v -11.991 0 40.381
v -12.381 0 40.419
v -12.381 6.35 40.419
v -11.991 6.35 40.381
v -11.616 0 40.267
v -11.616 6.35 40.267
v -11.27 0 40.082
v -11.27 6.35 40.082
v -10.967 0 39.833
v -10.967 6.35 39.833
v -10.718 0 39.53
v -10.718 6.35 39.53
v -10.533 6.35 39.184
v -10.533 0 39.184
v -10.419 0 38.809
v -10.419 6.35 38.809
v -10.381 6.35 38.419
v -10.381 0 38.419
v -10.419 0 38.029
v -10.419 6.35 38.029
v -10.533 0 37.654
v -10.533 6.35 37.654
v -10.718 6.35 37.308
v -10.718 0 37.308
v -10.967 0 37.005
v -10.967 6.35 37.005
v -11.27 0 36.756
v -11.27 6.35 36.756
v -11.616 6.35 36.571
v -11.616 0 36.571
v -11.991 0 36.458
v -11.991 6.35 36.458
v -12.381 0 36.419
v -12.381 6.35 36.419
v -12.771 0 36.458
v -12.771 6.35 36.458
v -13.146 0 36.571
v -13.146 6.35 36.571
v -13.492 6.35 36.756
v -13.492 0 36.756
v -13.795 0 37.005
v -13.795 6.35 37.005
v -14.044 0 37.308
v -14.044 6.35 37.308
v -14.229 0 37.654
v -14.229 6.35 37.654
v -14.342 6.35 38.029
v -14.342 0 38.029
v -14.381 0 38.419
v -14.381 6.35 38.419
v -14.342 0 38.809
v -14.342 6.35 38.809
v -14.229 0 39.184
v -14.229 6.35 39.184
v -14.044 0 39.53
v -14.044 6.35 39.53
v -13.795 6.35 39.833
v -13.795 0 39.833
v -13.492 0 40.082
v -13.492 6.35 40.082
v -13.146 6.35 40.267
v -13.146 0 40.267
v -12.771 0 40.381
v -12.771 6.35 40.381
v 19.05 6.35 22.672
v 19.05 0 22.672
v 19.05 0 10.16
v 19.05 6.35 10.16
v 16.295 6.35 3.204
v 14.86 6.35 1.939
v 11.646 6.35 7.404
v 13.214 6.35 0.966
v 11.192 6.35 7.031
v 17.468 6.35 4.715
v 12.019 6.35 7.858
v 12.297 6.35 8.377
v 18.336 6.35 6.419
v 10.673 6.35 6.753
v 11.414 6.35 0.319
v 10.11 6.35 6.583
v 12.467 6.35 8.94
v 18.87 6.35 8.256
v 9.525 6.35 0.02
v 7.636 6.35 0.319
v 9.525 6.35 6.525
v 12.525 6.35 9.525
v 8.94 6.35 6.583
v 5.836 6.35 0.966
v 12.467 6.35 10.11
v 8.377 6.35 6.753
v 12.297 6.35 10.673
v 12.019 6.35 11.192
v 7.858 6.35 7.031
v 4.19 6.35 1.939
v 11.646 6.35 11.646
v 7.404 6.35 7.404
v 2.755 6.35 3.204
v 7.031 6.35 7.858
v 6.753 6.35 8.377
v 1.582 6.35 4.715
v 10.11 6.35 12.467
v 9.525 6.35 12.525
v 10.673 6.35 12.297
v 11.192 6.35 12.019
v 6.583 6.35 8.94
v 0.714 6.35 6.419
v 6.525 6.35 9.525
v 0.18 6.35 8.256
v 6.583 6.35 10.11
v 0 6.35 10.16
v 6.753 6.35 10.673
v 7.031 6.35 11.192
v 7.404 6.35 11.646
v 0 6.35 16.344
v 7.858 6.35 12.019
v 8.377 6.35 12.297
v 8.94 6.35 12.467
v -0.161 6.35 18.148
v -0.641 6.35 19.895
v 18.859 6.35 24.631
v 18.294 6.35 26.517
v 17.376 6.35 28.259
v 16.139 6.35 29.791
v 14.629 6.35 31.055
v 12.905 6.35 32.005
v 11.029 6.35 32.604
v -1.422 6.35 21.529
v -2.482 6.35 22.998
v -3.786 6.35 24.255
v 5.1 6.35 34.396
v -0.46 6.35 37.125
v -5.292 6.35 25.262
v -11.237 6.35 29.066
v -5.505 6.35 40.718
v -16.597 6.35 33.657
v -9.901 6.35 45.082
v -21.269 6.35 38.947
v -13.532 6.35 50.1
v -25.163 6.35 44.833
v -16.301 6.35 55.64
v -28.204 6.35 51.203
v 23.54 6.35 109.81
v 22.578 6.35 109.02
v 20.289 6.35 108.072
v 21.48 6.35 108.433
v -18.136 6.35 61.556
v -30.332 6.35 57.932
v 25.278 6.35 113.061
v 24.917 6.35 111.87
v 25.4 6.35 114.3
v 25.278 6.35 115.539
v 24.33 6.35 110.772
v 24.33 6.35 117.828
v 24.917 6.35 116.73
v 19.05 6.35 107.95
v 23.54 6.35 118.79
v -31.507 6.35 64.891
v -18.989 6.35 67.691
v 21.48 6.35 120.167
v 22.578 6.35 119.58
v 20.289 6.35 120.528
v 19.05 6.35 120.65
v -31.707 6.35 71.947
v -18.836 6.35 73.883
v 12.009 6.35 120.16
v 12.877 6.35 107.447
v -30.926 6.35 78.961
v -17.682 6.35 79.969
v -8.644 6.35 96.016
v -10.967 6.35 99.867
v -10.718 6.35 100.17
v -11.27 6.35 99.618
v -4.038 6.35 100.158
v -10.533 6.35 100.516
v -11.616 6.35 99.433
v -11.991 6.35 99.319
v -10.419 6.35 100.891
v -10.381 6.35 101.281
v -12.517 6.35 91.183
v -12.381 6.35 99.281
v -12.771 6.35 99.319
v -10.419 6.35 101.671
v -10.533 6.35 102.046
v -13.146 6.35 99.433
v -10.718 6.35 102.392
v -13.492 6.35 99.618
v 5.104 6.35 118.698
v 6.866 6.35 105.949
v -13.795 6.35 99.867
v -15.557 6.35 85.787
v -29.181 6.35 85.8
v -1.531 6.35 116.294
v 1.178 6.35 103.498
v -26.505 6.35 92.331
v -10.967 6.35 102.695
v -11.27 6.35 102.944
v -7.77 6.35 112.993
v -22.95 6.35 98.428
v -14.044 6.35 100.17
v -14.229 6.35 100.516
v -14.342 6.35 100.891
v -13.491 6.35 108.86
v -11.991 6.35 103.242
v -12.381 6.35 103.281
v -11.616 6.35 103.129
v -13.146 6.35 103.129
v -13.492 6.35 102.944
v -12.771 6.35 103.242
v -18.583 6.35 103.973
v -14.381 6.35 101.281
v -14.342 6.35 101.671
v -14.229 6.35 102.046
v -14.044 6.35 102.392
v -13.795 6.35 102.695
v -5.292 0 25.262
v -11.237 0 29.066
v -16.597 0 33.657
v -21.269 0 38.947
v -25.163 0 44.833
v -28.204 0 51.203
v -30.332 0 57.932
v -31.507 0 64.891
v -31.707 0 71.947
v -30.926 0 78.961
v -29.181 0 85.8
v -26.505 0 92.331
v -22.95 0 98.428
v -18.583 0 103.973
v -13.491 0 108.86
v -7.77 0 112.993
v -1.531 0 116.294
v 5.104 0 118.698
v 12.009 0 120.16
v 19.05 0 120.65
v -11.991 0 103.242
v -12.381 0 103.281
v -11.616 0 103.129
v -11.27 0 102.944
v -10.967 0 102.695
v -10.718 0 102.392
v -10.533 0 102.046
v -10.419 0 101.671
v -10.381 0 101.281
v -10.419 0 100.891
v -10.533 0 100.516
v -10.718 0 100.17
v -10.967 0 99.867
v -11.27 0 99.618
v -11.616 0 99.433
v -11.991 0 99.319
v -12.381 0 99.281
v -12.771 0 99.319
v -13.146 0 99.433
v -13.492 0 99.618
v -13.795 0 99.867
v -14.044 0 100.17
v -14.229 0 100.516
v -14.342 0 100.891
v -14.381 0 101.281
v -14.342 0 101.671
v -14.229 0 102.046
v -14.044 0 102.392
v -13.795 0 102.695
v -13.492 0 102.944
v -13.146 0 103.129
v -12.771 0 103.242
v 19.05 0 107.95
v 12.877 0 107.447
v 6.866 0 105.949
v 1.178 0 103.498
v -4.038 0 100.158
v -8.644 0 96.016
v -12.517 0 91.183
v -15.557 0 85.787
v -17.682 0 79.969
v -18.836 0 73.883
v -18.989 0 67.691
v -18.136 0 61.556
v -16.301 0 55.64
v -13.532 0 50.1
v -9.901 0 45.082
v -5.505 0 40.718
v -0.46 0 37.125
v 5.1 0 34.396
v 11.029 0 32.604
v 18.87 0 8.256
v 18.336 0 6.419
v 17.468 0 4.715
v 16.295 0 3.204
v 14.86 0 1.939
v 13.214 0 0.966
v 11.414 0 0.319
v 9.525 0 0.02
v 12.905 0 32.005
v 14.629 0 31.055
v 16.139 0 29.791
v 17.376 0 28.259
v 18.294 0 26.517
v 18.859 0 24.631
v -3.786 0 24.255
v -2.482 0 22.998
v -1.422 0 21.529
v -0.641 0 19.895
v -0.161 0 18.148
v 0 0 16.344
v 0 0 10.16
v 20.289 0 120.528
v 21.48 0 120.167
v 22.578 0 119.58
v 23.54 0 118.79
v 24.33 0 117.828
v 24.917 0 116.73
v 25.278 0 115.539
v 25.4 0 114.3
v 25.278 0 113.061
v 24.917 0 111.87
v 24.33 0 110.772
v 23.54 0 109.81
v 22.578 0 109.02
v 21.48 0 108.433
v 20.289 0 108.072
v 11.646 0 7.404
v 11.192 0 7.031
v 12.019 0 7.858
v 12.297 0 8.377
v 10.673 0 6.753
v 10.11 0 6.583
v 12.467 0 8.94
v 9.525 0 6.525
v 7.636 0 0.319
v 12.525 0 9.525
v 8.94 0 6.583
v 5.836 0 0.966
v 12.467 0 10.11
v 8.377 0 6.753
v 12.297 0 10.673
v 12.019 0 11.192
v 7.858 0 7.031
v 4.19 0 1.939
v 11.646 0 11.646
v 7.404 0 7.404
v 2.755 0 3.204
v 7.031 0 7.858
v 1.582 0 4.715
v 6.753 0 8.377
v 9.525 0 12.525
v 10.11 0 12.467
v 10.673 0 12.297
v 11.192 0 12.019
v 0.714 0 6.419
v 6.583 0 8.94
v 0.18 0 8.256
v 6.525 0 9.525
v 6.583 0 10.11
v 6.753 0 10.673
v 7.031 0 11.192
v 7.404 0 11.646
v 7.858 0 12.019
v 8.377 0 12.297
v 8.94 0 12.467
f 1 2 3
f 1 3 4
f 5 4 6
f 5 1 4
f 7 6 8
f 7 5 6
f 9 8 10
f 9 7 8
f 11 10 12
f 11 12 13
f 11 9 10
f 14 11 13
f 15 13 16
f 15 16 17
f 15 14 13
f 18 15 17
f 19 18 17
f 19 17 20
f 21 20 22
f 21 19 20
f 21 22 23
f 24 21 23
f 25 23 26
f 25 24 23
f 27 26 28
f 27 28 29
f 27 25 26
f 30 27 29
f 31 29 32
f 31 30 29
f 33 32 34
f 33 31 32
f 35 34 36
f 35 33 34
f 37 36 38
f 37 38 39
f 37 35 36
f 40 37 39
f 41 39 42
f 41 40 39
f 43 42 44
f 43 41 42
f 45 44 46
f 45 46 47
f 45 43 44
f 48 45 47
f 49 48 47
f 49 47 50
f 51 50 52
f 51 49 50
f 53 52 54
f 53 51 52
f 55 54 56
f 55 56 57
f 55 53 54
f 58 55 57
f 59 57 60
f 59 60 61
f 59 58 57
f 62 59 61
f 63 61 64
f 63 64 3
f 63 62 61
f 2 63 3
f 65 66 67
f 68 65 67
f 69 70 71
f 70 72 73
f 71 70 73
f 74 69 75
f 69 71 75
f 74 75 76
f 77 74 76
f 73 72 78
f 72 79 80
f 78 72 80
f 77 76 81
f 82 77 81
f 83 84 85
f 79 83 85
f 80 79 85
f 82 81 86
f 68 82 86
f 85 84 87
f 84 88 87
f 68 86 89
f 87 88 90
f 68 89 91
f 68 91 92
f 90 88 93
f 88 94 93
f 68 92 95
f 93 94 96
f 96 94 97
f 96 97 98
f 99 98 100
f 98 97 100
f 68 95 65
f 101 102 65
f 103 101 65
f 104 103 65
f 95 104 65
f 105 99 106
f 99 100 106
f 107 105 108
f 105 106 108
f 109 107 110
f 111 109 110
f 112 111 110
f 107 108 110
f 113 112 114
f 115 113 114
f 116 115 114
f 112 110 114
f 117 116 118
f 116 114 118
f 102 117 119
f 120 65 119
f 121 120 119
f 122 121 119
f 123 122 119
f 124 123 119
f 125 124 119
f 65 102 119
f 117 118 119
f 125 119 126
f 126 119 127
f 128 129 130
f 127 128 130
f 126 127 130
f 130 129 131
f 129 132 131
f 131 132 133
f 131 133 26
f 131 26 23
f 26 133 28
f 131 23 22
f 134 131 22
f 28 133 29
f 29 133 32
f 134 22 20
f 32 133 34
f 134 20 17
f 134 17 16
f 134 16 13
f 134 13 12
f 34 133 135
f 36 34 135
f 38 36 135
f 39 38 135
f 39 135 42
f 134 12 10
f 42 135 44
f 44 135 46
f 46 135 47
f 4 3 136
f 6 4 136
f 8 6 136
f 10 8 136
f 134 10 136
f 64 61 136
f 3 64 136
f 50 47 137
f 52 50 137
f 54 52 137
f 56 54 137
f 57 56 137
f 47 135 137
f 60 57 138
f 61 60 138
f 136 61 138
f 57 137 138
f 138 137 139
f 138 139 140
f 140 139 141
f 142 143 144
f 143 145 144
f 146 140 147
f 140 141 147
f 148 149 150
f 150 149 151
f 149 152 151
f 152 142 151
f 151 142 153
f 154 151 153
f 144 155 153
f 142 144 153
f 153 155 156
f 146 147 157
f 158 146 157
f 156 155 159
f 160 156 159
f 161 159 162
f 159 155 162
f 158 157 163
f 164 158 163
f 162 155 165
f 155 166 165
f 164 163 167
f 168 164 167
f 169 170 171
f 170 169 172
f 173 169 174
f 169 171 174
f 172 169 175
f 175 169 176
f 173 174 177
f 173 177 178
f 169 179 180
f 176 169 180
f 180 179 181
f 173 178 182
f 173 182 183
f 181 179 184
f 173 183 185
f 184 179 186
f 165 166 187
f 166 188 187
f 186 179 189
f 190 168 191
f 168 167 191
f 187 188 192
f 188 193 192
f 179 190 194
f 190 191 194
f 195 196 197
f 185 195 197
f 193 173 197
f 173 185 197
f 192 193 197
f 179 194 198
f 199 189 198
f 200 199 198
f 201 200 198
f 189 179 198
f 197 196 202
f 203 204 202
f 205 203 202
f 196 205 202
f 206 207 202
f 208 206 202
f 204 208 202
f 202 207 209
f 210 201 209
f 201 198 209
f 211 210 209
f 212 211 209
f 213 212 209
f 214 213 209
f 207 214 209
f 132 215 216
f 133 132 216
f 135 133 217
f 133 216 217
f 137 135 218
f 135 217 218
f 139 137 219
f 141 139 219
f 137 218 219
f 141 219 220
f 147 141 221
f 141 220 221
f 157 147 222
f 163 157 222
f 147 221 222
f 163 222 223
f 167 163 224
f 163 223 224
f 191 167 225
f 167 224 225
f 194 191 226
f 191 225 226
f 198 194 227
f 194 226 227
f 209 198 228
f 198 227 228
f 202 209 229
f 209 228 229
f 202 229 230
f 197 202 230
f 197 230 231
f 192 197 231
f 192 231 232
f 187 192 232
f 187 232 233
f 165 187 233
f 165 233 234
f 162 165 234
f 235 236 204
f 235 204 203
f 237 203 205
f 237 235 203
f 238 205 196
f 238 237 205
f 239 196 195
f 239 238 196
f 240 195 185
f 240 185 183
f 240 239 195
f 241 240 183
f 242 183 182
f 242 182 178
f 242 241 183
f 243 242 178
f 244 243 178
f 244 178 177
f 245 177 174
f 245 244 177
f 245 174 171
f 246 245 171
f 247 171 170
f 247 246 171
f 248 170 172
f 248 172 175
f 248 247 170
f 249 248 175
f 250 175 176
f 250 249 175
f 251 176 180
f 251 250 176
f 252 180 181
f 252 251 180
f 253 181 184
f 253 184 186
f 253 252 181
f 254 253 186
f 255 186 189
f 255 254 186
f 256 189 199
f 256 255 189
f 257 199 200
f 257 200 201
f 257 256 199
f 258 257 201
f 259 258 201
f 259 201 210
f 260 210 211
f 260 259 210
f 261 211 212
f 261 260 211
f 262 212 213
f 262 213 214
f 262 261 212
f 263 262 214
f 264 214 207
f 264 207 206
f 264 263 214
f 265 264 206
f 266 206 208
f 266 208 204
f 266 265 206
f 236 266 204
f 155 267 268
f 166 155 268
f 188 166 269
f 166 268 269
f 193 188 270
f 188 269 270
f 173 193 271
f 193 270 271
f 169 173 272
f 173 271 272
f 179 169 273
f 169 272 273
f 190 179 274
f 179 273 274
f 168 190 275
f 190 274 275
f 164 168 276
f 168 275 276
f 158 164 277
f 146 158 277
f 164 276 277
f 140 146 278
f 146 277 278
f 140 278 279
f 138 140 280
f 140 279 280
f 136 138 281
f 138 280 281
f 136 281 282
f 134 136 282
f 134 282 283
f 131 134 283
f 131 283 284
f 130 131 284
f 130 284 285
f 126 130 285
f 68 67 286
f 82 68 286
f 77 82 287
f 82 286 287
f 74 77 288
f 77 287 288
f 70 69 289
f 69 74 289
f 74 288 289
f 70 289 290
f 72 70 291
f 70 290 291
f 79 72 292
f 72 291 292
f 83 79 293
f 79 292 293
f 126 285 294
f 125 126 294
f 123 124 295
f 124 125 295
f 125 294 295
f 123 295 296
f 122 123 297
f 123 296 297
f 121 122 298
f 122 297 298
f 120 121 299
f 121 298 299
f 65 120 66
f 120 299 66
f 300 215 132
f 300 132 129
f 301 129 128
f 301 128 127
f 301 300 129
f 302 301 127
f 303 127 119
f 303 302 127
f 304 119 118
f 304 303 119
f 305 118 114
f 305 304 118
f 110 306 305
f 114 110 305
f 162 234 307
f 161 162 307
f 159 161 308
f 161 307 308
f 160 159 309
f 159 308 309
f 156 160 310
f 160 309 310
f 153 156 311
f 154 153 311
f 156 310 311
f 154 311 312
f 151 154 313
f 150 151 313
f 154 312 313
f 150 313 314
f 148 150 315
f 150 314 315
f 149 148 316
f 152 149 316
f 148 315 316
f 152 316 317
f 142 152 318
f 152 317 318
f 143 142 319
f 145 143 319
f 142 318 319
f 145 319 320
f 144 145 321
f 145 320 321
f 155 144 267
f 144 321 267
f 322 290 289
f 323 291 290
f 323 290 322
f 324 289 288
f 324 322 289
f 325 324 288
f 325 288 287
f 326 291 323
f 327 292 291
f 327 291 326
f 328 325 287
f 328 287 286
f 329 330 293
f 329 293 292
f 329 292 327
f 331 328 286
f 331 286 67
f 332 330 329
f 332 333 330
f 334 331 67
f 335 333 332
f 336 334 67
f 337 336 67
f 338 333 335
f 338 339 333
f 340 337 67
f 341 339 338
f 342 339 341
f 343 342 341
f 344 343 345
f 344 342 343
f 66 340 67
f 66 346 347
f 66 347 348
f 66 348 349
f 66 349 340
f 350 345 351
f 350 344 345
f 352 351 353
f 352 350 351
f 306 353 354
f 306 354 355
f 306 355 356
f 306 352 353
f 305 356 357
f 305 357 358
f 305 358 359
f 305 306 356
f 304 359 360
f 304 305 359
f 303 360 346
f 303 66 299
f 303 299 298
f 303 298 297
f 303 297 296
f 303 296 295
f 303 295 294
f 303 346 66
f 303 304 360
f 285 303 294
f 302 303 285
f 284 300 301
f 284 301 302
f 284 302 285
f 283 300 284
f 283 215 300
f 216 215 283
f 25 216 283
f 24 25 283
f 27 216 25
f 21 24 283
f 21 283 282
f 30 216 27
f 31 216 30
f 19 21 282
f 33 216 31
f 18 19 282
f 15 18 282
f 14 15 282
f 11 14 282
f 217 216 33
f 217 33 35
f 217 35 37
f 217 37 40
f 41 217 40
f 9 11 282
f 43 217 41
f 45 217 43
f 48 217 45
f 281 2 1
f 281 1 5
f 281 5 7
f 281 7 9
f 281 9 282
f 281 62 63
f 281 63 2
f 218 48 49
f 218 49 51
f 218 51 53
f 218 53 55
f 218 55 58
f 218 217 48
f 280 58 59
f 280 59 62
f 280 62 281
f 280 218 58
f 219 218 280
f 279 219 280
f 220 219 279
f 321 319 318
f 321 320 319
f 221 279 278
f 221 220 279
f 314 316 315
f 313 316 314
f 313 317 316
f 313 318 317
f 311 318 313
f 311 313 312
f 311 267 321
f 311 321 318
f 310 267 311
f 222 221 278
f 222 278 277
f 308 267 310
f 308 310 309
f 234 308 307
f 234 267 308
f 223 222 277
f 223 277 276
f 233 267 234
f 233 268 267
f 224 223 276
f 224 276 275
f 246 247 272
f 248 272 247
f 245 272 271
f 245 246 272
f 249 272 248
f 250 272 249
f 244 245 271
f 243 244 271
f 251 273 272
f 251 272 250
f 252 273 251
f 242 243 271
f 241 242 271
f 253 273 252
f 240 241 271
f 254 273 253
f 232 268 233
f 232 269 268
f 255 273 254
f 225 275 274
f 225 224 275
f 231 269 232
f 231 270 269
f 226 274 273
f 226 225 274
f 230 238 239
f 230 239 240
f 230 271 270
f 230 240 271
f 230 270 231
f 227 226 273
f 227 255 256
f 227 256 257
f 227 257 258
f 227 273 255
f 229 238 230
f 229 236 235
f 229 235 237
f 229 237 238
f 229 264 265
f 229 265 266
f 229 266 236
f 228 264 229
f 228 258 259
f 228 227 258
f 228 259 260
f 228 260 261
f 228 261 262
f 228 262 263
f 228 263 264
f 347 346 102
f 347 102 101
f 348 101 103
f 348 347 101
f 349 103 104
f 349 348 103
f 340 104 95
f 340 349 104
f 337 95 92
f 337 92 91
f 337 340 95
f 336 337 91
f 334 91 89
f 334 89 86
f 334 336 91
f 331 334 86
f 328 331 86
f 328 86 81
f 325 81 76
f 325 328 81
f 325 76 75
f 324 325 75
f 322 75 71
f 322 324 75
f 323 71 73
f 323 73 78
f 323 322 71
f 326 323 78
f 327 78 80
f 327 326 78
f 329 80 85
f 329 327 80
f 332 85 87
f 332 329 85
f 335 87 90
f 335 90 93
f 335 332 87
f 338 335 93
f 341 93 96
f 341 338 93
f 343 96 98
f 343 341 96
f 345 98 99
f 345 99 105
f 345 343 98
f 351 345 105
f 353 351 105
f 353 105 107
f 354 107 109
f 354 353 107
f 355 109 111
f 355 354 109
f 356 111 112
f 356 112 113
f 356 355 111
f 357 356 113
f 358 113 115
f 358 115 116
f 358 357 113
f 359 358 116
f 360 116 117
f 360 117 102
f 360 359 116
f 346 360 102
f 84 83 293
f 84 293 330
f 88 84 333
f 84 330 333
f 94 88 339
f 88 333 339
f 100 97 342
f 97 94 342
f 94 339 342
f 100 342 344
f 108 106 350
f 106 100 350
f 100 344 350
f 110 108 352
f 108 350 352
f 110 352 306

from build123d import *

# Parameters (mm, degrees)
SKETCH1_R           = 3
SKETCH1_R_2         = 2
BOSS_EXTRUDE1_DEPTH = 6.35
FILLET1_R           = 10.16


with BuildPart() as part:
    # Sketch1 → Boss-Extrude1 (new body)
    with BuildSketch(Plane(origin=(0, 0, 0), x_dir=(1, 0, 0), z_dir=(0, 1, 0))):
        with BuildLine():
            Line((19.05, 0), (0, 0))
            Line((0, 0), (0, -22.757139607))
            ThreePointArc((0, -22.757139607), (-30.814603217, -79.553676933), (19.05, -120.65))
            ThreePointArc((19.05, -120.65), (25.4, -114.3), (19.05, -107.95))
            ThreePointArc((19.05, -107.95), (-19.05, -69.85), (19.05, -31.75))
            Line((19.05, -31.75), (19.05, 0))
        make_face()
        with Locations(Location((9.525, -9.525, 0), (0, 0, 270))):
            Circle(SKETCH1_R, mode=Mode.SUBTRACT)
        with Locations(Location((-12.380896424, -38.419103576, 0), (0, 0, 270))):
            Circle(SKETCH1_R_2, mode=Mode.SUBTRACT)
        with Locations(Location((-12.380896424, -101.280896424, 0), (0, 0, 270))):
            Circle(SKETCH1_R_2, mode=Mode.SUBTRACT)
    extrude(amount=BOSS_EXTRUDE1_DEPTH)

    # Fillet1
    # the kernel refuses this fillet: 10.16 mm, written as the material it adds along each edge
    with BuildSketch(Plane(origin=(0, 0, 22.757139607), x_dir=(0, 0, -1), z_dir=(0, 1, 0))) as fillet1_piece_1:
        with BuildLine():
            CenterArc((6.413190667, 10.16), FILLET1_R, 208.630989837, 61.369010163)
            ThreePointArc((-2.50448451, 5.291666667), (-1.175949507, 2.681941807), (0, 0))
            Line((0, 0), (6.413190667, 0))
        make_face()
    extrude(amount=6.35)
    # the kernel refuses this fillet: 10.16 mm, written as the material it takes off along each edge
    with BuildSketch(Plane(origin=(19.05, -22.696015193, 31.75), x_dir=(0, 0, -1), z_dir=(0, 1, 0))) as fillet1_2_piece_1:
        with BuildLine():
            CenterArc((9.078406077, 10.16), FILLET1_R, 192.153197469, 77.846802531)
            ThreePointArc((-0.853889939, 8.021052632), (-0.214073897, 4.033187739), (0, 0))
            Line((0, 0), (9.078406077, 0))
        make_face()
    extrude(amount=51.742030387, mode=Mode.SUBTRACT)
    with BuildSketch(Plane(origin=(0, -25.4, 0), x_dir=(1, 0, 0), z_dir=(0, 1, 0)), Plane(origin=(19.05, -25.4, 0), x_dir=(0, 0, 1), z_dir=(0, 1, 0))) as fillet1_2_piece_2:
        with BuildLine():
            CenterArc((FILLET1_R, -FILLET1_R), FILLET1_R, 90, 90)
            Line((0, -FILLET1_R), (0, 0))
            Line((0, 0), (FILLET1_R, 0))
        make_face()
    extrude(amount=57.15, mode=Mode.SUBTRACT)


solid = part.part
